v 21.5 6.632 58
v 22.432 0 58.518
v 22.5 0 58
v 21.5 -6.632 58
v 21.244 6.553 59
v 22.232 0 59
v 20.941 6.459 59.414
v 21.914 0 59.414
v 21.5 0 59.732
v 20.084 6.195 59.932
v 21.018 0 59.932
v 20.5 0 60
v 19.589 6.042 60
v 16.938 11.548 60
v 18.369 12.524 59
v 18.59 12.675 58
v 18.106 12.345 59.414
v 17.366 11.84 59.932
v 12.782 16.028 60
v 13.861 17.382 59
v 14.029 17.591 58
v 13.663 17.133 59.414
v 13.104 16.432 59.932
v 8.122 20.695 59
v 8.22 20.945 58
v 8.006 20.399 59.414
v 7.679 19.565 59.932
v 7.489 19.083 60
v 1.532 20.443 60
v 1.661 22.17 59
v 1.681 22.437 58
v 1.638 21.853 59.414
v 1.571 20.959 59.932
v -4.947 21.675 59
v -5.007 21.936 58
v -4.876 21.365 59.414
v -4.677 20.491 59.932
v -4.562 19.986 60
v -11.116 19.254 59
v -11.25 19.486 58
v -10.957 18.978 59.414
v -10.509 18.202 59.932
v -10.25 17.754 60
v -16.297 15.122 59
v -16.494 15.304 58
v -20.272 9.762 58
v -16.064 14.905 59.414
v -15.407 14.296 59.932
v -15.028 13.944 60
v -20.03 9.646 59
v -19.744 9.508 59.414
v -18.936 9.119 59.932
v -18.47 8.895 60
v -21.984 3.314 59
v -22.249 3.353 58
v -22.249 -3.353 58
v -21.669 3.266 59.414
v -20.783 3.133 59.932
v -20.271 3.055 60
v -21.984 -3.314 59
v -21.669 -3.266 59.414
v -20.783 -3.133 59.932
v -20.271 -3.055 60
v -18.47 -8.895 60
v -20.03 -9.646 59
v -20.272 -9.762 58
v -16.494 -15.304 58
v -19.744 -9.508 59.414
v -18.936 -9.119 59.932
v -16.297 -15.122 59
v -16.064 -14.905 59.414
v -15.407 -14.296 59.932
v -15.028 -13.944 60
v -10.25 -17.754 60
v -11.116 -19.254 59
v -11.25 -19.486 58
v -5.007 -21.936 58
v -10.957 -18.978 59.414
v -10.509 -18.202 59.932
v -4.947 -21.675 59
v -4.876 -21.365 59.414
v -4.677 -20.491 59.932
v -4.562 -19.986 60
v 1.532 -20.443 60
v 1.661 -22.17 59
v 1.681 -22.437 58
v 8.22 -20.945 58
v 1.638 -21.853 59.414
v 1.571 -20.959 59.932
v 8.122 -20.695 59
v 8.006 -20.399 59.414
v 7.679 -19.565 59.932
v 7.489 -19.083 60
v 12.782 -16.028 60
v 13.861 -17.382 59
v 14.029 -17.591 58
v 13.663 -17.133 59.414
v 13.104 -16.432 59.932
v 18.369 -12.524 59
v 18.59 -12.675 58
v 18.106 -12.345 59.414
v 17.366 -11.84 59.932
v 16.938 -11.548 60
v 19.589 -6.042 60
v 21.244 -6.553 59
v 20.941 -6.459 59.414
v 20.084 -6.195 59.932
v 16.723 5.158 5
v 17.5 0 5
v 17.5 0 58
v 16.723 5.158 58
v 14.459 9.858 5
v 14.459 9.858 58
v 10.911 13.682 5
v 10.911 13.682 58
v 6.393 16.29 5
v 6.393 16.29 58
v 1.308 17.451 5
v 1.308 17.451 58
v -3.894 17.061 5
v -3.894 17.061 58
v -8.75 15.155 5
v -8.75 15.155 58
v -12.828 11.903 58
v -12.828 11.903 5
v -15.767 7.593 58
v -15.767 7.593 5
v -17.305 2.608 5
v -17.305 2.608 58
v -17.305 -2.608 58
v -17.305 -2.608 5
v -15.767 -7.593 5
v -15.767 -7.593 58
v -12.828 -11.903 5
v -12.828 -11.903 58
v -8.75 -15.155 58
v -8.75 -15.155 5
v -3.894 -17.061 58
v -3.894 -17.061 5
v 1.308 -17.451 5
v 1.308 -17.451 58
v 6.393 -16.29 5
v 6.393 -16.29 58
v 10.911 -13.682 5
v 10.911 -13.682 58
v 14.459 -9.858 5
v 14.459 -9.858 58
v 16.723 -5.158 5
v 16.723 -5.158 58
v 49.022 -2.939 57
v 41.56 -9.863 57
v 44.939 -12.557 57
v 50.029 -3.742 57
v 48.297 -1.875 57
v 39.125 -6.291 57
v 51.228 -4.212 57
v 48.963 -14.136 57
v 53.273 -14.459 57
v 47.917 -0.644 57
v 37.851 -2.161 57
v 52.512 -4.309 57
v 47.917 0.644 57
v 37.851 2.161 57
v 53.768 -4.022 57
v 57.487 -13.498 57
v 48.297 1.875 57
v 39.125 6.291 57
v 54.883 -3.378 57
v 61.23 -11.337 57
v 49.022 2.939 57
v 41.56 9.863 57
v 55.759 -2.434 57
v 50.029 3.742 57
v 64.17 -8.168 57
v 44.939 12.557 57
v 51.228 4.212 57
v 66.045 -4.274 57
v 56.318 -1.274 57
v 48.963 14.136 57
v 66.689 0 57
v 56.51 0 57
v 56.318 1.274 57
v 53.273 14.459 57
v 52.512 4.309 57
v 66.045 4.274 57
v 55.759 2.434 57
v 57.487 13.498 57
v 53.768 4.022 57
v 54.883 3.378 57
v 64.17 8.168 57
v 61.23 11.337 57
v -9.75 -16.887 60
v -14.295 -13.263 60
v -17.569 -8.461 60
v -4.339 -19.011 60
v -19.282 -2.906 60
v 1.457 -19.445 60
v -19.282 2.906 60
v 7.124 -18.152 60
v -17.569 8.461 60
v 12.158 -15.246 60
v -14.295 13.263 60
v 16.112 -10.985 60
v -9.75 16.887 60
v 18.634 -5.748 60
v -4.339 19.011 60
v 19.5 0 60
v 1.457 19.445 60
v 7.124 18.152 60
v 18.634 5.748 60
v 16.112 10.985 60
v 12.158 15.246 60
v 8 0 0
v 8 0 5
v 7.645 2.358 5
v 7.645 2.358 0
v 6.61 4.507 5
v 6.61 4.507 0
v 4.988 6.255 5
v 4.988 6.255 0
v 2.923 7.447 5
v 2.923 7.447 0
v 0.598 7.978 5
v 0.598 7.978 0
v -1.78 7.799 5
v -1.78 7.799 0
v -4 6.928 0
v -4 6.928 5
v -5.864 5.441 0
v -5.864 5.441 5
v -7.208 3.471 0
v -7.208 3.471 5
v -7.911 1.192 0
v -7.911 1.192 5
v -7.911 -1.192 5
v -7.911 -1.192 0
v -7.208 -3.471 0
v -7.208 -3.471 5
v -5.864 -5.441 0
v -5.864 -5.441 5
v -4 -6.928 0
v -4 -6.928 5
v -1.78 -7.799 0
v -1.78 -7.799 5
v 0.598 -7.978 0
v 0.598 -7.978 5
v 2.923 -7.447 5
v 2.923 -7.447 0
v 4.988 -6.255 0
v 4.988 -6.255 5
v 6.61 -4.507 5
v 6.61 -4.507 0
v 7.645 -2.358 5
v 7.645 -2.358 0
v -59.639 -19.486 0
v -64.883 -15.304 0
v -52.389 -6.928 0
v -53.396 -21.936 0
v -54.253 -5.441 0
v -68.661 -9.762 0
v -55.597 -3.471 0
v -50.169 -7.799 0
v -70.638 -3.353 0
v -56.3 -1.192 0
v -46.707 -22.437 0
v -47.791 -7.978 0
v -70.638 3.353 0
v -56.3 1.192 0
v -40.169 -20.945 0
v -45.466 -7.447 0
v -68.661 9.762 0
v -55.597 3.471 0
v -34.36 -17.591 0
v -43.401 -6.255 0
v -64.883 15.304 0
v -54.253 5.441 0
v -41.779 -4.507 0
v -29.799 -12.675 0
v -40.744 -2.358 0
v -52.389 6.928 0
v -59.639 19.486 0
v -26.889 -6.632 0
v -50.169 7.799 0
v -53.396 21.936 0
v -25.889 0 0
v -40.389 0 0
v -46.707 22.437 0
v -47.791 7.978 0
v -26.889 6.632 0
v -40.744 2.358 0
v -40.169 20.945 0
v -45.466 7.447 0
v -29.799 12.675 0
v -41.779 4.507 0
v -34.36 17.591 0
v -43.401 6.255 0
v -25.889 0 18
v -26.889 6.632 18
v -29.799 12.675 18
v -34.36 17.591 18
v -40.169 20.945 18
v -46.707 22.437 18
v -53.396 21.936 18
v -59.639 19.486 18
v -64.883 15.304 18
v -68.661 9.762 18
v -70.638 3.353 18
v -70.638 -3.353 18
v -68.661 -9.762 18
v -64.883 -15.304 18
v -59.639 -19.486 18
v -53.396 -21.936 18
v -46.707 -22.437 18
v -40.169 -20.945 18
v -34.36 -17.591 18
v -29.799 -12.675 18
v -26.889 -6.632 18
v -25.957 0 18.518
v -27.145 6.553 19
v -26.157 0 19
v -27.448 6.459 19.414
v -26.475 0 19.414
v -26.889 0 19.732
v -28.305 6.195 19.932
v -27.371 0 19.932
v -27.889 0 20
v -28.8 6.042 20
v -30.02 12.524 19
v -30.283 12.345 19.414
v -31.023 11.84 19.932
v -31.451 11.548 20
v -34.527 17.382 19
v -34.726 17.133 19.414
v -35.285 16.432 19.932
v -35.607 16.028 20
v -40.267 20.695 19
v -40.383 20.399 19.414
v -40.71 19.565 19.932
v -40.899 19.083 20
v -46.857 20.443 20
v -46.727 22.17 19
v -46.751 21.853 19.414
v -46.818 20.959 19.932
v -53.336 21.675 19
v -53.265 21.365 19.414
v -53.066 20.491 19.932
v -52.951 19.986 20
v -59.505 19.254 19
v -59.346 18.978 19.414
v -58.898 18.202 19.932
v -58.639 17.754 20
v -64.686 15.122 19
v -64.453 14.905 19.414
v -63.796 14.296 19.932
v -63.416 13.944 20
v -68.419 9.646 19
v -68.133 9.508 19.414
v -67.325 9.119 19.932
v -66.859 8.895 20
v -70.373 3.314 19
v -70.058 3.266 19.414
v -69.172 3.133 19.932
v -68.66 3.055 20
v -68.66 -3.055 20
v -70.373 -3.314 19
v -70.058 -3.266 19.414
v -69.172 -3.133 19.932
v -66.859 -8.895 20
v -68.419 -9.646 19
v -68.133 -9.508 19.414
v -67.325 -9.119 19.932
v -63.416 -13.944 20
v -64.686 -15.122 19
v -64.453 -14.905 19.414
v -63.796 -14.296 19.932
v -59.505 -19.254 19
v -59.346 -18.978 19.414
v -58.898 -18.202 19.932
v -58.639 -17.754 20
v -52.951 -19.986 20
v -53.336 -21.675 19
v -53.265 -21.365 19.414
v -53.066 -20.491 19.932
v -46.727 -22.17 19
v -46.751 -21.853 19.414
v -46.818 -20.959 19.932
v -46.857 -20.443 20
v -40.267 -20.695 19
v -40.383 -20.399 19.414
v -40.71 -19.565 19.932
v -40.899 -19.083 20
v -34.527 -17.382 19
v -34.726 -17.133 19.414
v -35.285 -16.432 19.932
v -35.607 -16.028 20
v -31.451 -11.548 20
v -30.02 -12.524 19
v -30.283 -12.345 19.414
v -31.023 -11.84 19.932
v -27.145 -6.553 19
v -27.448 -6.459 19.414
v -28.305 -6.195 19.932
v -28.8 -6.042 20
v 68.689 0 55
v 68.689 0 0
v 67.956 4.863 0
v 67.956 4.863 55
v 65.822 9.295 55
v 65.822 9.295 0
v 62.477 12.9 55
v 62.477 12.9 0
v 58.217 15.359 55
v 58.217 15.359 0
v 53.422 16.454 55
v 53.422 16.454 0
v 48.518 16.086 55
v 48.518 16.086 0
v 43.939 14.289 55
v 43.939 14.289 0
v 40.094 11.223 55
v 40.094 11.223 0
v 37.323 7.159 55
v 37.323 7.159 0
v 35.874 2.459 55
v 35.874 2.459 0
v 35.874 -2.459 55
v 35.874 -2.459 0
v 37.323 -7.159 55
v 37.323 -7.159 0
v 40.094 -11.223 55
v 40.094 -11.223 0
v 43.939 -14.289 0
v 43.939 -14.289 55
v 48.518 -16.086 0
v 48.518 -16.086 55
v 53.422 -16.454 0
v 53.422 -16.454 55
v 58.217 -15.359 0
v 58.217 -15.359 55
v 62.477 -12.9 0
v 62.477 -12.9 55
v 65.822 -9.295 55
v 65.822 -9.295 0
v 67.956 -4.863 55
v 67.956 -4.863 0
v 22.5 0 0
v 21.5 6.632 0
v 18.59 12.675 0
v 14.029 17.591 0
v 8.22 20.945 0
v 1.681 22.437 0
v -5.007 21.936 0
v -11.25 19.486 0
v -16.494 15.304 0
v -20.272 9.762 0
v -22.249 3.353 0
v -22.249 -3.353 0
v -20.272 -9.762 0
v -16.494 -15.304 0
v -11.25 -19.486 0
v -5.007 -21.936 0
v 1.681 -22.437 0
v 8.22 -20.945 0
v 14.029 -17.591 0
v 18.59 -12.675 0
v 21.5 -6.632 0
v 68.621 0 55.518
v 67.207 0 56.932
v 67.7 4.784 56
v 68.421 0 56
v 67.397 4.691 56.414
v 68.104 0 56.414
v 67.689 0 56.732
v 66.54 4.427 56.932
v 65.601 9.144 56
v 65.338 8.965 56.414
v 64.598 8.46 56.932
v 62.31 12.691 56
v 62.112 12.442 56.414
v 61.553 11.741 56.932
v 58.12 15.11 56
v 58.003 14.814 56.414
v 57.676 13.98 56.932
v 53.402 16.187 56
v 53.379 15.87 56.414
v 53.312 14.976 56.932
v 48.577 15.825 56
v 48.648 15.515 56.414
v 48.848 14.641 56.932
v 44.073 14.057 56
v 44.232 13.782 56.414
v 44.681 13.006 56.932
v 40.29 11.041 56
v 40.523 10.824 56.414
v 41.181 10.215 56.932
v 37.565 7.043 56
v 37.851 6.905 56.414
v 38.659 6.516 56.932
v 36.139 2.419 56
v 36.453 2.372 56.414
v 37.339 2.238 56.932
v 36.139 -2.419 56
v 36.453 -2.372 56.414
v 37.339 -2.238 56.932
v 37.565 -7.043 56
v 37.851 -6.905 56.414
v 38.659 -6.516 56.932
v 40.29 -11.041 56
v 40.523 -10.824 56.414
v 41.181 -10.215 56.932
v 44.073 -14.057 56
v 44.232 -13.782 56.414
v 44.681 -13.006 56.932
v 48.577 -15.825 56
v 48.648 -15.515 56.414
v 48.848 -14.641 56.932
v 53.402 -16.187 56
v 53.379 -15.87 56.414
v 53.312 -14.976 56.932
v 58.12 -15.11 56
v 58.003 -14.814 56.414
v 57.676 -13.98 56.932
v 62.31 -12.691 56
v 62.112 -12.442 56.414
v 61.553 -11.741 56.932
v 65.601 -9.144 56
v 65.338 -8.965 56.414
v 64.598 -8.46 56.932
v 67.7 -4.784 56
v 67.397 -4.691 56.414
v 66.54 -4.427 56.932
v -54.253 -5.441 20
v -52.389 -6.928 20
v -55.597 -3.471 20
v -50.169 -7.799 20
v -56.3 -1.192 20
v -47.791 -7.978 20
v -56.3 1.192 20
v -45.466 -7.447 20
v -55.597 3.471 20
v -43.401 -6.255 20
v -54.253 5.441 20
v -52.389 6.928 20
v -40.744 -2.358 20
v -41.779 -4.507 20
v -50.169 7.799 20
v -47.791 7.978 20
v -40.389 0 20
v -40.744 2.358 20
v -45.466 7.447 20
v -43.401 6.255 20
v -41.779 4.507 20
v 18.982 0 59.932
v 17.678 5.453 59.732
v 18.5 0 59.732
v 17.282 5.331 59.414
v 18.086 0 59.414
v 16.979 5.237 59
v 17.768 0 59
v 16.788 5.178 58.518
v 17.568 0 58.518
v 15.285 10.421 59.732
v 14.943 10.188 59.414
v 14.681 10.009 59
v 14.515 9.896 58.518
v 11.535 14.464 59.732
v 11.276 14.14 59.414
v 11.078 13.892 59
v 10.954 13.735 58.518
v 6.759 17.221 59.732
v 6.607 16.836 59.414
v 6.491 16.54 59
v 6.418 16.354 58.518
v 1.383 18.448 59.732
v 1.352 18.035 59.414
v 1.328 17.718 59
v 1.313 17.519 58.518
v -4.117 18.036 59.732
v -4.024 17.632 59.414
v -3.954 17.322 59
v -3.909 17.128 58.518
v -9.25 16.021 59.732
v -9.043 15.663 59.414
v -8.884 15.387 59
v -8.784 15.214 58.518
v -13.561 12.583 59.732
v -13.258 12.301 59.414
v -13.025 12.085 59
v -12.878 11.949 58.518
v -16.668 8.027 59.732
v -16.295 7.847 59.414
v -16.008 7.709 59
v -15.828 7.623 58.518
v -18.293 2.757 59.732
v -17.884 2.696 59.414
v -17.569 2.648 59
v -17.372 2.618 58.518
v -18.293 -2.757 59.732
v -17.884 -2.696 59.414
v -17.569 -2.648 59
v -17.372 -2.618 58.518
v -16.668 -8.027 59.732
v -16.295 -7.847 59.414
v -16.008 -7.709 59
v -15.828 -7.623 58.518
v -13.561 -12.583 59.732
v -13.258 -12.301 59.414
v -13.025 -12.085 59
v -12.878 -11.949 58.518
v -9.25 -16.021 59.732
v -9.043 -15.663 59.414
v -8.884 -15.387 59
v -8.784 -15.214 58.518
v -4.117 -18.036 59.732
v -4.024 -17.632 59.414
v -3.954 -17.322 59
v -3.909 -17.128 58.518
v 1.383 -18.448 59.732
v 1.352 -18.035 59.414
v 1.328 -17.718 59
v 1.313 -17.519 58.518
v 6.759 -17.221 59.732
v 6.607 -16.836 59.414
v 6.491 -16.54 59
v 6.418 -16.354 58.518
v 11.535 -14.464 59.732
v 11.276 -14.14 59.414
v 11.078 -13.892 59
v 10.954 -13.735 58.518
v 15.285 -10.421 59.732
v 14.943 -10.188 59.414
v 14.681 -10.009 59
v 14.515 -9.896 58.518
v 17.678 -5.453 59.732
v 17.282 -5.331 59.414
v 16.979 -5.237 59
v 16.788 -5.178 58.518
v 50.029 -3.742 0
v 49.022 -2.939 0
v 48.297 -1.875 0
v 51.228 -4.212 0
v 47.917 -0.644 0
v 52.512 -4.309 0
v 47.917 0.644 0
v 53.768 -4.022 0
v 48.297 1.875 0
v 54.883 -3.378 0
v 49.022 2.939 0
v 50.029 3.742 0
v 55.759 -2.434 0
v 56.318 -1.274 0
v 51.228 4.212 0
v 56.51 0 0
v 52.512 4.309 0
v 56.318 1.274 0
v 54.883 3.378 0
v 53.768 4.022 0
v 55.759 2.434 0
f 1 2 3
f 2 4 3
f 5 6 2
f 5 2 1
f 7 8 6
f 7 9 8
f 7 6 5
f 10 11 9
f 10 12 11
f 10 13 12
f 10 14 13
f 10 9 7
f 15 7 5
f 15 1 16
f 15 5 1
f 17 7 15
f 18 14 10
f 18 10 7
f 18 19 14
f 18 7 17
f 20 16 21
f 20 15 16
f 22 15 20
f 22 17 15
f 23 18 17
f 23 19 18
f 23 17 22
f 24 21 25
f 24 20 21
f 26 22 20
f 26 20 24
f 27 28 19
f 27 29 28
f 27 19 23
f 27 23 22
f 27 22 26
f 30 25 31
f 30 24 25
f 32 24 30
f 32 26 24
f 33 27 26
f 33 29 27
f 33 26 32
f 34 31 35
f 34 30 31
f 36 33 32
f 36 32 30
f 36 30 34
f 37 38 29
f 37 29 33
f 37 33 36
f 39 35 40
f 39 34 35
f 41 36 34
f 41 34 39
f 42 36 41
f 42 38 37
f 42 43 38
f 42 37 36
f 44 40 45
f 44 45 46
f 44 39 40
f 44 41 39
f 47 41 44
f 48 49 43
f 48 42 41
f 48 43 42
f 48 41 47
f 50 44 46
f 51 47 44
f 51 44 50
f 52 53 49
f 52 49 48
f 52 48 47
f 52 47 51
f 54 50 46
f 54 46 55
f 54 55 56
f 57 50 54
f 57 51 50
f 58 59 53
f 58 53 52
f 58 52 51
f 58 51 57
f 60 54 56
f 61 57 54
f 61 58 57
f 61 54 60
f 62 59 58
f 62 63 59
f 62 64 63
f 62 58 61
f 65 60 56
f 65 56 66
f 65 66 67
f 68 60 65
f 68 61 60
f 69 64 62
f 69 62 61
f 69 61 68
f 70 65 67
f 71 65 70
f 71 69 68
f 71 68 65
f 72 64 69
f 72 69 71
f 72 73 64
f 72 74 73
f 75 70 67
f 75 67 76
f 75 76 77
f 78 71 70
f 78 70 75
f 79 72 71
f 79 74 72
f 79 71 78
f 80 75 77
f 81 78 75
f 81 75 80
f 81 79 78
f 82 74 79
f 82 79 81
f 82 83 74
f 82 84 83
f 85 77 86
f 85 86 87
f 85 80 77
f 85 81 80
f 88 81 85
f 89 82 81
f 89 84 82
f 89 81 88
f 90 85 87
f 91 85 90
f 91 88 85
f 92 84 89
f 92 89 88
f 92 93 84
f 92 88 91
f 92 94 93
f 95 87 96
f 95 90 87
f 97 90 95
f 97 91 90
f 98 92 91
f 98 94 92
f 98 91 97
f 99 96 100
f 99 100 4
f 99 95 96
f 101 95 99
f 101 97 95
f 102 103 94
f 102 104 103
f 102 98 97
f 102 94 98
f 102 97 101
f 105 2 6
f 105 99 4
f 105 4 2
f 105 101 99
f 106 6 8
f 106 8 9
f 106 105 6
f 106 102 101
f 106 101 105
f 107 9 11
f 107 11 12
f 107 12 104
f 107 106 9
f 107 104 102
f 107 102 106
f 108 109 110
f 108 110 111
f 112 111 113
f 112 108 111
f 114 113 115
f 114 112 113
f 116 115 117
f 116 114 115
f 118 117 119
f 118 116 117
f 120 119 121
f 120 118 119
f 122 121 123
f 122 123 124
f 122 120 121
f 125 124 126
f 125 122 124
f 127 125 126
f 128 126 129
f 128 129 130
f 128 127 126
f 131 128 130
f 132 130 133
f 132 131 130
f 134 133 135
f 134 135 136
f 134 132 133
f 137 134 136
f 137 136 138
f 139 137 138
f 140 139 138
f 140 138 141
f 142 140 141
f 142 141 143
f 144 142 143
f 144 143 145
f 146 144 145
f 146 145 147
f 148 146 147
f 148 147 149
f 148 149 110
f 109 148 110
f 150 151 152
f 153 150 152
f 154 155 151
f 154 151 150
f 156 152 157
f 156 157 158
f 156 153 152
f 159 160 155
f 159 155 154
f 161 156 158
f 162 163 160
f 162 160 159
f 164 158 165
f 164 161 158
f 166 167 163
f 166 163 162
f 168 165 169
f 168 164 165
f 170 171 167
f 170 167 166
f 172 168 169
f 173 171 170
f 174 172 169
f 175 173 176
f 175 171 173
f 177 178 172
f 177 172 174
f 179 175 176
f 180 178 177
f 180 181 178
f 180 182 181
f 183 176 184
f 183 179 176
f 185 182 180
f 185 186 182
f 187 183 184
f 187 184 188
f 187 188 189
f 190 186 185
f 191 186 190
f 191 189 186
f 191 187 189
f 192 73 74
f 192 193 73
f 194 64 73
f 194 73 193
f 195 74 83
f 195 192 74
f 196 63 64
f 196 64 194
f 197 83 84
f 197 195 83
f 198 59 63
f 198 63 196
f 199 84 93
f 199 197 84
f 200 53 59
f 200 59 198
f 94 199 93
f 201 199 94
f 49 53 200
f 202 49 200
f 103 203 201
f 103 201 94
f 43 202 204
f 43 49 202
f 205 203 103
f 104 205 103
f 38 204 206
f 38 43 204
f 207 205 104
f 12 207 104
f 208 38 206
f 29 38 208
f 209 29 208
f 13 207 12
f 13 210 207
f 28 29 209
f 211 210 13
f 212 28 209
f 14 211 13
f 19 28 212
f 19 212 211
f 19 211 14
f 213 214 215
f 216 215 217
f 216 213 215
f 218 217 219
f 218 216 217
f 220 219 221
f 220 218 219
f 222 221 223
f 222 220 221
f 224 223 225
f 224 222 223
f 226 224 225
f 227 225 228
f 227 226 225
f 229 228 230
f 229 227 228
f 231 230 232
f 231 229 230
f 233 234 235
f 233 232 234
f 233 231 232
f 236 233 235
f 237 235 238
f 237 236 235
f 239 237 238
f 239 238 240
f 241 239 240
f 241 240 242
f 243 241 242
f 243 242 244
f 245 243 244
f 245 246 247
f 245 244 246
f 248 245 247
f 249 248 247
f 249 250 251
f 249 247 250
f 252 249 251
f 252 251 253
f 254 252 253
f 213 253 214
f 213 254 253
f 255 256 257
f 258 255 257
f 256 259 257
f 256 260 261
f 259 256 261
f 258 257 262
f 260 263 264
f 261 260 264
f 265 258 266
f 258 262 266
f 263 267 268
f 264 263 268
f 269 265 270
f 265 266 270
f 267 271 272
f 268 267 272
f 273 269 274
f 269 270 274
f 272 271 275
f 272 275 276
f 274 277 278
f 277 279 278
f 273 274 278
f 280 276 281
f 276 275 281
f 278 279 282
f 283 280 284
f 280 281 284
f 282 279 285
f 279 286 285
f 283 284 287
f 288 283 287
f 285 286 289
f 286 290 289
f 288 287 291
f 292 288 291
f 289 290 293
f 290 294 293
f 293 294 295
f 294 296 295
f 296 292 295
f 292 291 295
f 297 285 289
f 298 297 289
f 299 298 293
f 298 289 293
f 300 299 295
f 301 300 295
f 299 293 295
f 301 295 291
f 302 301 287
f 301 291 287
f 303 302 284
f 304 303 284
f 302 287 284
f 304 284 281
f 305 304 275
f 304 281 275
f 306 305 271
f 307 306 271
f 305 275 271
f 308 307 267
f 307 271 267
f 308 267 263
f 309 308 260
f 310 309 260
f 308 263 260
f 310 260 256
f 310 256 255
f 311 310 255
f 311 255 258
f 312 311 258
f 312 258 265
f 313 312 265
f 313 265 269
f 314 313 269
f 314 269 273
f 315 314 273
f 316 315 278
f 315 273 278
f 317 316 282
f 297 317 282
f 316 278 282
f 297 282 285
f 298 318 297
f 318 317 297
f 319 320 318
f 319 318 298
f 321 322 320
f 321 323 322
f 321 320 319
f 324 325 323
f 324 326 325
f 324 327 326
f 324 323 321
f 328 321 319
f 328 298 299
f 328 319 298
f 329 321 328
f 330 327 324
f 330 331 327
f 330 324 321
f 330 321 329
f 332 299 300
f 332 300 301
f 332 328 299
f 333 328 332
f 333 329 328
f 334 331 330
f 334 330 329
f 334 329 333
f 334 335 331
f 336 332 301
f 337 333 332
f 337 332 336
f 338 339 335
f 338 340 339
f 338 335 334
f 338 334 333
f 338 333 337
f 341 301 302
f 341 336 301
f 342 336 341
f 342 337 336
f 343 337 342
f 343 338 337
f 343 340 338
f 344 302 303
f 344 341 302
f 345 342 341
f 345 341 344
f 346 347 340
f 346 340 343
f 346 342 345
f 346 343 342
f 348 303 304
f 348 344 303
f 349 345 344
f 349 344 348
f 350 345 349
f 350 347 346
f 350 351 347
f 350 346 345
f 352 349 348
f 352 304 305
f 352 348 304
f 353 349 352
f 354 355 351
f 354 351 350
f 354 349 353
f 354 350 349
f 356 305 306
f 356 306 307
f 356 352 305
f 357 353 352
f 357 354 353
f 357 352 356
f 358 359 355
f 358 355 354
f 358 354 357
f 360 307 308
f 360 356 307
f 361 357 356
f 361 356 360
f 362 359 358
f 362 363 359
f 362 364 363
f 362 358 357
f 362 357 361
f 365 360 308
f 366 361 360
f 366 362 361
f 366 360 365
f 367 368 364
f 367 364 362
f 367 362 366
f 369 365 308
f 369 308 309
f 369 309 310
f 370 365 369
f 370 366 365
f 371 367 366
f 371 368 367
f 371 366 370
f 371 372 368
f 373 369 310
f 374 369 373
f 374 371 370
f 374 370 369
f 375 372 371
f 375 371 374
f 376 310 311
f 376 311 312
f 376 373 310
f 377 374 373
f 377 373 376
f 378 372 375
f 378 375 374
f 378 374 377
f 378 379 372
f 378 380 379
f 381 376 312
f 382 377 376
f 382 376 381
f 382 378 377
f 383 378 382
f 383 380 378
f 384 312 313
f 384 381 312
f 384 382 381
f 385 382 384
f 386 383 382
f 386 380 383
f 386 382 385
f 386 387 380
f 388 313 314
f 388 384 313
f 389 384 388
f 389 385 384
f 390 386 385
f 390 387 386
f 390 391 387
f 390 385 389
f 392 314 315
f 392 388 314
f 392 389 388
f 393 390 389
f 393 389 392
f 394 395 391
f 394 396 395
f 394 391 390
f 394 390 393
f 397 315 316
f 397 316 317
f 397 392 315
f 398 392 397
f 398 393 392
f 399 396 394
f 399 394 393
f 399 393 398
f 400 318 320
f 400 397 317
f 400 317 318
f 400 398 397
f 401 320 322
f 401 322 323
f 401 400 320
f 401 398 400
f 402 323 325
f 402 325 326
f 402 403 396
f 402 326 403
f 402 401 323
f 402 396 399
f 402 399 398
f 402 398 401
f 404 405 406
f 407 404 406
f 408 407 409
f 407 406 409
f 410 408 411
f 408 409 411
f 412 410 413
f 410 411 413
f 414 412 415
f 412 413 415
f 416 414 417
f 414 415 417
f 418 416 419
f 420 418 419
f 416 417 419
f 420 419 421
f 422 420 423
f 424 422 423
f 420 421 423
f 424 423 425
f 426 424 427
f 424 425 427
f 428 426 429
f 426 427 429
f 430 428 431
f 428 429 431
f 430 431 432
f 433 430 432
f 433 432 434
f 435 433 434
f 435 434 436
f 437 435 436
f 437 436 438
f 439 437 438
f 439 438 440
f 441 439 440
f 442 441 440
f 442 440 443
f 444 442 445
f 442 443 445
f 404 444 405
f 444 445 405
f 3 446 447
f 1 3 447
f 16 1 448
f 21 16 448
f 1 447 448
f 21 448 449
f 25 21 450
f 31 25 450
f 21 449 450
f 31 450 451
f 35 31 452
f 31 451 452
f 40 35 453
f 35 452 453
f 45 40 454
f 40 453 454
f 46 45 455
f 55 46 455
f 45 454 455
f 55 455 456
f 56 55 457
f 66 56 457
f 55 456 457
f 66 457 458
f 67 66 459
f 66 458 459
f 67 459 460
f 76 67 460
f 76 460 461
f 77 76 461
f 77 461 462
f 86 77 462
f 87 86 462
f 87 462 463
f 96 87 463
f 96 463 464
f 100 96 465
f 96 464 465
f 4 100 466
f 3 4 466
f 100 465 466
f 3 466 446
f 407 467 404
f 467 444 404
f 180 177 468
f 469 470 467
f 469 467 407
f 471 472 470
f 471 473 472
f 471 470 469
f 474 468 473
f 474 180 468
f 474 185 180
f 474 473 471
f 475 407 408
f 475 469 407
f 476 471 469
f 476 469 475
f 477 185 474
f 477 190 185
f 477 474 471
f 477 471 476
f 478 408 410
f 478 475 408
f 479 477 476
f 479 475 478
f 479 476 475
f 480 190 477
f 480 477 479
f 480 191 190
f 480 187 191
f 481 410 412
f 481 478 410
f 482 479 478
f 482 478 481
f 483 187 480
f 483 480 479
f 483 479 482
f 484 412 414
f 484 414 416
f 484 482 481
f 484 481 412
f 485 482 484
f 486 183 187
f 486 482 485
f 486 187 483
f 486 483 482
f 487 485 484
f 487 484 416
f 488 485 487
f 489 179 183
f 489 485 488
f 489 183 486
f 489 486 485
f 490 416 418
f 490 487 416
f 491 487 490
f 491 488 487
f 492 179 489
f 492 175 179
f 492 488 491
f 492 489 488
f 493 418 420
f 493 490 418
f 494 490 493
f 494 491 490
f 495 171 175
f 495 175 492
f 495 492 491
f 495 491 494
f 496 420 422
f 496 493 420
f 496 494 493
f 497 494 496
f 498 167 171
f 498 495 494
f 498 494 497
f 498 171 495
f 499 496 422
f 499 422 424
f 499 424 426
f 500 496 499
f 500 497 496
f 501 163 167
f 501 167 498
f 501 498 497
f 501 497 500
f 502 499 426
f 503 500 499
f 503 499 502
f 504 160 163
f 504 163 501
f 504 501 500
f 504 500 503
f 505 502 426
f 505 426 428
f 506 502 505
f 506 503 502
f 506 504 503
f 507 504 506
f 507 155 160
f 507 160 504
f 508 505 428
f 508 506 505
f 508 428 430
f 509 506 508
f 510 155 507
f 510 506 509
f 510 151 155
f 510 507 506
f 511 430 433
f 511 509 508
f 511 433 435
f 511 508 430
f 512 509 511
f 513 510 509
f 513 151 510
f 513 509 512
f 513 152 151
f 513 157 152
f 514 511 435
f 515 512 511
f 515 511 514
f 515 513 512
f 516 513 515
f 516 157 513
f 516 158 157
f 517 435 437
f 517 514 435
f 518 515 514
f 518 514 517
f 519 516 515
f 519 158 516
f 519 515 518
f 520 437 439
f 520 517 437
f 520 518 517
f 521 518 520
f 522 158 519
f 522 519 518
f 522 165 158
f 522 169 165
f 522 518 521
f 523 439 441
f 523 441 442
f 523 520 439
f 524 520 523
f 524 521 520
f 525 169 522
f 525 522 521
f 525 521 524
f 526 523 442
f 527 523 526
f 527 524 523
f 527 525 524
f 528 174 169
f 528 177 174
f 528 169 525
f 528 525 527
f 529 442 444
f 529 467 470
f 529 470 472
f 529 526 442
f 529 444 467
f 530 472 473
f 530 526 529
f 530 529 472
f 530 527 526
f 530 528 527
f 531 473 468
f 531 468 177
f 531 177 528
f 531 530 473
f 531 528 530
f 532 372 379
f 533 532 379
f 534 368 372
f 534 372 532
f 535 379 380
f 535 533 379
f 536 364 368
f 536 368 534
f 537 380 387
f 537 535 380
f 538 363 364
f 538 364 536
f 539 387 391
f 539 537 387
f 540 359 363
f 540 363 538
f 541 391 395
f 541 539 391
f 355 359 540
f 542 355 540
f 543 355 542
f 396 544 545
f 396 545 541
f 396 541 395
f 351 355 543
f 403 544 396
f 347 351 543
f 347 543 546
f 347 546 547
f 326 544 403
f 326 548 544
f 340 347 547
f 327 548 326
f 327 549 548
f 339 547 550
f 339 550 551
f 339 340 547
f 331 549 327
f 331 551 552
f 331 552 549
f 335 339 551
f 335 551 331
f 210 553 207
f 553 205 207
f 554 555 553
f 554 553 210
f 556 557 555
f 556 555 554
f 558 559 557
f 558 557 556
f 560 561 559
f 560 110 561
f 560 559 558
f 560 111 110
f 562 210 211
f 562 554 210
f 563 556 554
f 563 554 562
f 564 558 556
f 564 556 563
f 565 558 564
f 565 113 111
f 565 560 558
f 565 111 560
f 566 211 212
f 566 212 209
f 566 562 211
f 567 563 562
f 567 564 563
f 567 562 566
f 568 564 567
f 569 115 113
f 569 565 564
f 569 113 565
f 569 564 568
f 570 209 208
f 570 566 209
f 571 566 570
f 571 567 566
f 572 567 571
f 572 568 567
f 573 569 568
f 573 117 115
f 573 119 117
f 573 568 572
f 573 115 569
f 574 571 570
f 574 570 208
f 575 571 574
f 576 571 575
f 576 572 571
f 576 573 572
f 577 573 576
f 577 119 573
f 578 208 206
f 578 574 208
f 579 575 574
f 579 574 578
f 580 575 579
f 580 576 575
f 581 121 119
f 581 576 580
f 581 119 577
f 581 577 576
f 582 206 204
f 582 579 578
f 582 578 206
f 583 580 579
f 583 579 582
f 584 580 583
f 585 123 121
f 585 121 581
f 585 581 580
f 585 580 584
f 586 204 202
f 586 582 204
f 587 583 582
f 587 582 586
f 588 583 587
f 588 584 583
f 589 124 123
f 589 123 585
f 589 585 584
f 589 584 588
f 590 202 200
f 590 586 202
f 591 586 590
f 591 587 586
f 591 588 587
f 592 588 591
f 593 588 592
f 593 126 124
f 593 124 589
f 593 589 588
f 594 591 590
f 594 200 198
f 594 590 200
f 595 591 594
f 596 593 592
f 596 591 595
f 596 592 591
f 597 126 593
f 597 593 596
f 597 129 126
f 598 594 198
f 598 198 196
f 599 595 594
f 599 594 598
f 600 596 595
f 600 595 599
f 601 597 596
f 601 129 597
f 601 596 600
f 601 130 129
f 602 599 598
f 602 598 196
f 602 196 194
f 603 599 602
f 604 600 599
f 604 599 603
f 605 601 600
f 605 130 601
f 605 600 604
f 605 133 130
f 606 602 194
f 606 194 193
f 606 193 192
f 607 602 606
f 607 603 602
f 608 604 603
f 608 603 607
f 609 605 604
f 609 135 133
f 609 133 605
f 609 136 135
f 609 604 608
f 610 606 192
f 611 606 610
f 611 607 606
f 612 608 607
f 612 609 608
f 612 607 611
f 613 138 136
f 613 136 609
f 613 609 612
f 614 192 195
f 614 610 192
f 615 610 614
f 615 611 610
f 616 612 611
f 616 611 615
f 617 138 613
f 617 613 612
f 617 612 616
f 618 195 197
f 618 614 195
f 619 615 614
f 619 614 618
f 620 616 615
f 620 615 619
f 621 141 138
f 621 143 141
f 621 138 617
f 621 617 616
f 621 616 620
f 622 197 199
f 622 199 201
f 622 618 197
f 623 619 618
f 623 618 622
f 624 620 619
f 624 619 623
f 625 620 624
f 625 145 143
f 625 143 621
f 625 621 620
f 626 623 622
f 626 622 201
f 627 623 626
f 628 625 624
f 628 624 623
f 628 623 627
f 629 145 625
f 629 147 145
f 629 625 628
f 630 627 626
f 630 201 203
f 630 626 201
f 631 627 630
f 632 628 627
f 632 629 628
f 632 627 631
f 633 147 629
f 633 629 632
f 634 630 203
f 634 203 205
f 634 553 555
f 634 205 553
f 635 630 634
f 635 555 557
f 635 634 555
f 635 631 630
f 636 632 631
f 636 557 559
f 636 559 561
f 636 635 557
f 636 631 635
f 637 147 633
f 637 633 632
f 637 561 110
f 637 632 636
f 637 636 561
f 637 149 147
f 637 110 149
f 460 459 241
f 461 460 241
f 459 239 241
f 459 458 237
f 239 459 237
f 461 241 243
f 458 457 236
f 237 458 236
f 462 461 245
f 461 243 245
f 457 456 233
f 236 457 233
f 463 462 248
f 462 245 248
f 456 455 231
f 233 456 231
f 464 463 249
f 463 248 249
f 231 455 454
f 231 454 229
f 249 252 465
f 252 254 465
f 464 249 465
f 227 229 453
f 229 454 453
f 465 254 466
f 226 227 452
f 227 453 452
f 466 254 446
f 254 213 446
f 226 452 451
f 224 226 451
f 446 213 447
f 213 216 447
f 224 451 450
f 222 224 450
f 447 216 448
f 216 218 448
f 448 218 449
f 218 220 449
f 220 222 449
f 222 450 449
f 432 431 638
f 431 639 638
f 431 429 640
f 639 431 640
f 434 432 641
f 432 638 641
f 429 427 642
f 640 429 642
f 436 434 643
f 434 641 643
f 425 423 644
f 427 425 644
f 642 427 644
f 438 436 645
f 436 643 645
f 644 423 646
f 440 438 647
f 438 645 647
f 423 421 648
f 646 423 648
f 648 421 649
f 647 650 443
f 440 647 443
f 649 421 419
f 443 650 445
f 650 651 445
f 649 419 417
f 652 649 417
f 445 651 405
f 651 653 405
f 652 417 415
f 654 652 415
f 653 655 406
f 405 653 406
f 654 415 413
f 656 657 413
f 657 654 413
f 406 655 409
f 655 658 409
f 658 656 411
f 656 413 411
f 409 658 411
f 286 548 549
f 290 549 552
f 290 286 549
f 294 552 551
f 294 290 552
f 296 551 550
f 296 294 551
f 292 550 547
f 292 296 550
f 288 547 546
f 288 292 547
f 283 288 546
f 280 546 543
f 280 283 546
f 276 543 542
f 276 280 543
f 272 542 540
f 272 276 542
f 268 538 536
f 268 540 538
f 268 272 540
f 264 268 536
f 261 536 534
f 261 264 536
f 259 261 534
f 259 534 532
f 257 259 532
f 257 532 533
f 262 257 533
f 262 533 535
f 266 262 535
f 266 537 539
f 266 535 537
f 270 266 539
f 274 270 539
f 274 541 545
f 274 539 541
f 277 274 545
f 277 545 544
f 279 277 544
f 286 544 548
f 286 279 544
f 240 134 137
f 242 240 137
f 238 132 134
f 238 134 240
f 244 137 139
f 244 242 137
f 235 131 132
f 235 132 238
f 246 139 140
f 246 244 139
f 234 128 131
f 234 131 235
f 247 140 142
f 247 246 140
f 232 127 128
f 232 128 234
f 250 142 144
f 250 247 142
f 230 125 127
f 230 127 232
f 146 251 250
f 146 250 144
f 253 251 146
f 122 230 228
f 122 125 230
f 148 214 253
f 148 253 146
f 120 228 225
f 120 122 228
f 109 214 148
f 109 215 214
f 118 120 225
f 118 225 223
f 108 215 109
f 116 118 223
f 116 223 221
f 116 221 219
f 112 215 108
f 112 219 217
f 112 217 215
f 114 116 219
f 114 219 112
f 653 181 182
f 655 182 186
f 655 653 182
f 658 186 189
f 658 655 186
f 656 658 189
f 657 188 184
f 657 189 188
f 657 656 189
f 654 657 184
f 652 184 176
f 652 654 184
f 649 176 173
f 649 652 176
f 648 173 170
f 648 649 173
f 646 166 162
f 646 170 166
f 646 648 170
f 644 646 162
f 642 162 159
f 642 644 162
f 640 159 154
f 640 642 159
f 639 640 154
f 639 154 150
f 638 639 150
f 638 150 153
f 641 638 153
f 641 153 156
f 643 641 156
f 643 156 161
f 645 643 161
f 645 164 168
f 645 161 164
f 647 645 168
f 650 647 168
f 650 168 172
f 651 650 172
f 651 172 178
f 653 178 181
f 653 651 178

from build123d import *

# Parameters (mm, degrees)
F0_R     = 22.5
F1_DEPTH = 60
F2_T     = -5
F3_R     = 16.5
F4_DEPTH = 57
F5_R     = 22.5
F6_DEPTH = 20
F7_R     = 2
F7_2_R   = 2
F7_3_R   = 2
F8_R     = 8
F8_R_2   = 4.3206160925
F9_DEPTH = 104.9


with BuildPart() as f1:
    # F0 (on Top) → F1 (new body)
    with BuildSketch(Plane.XY):
        Circle(F0_R)
    extrude(amount=F1_DEPTH)

    # F2
    f2_openings = [f1.faces().sort_by_distance(p)[0] for p in [
        (0, 0, 60),
    ]]
    offset(amount=F2_T, openings=f2_openings)

    # F7#2
    f7_2_edges = [f1.edges().sort_by_distance(p)[0] for p in [
        (-17.5, 0, 60),
        (-22.5, 0, 60),
    ]]
    fillet(f7_2_edges, radius=F7_2_R)


with BuildPart() as f4:
    # F3 (on Top) → F4 (new body)
    with BuildSketch(Plane.XY):
        with Locations((52.1893501282, 0)):
            Circle(F3_R)
    extrude(amount=F4_DEPTH)

    # F7
    f7_edges = [f4.edges().sort_by_distance(p)[0] for p in [
        (35.68935, 0, 57),
    ]]
    fillet(f7_edges, radius=F7_R)


with BuildPart() as f6:
    # F5 (on Top) → F6 (new body)
    with BuildSketch(Plane.XY):
        with Locations((-48.3888917542, 0)):
            Circle(F5_R)
    extrude(amount=F6_DEPTH)

    # F7#3
    f7_3_edges = [f6.edges().sort_by_distance(p)[0] for p in [
        (-70.888892, 0, 20),
    ]]
    fillet(f7_3_edges, radius=F7_3_R)


with BuildPart() as f9_tool:
    # F8 (on Top) → F9 (new body)
    with BuildSketch(Plane.XY):
        with Locations((-48.3888917542, 0)):
            Circle(F8_R)
        with Locations((52.1893501282, 0)):
            Circle(F8_R_2)
        Circle(F8_R)
    extrude(amount=F9_DEPTH)


with BuildPart() as f1_1:
    add(f1.part)

    # F9: cut by f9_tool
    add(f9_tool.part, mode=Mode.SUBTRACT)


with BuildPart() as f4_1:
    add(f4.part)

    # F9: cut by f9_tool
    add(f9_tool.part, mode=Mode.SUBTRACT)


with BuildPart() as f6_1:
    add(f6.part)

    # F9: cut by f9_tool
    add(f9_tool.part, mode=Mode.SUBTRACT)


solid = Compound([f1_1.part, f4_1.part, f6_1.part])
